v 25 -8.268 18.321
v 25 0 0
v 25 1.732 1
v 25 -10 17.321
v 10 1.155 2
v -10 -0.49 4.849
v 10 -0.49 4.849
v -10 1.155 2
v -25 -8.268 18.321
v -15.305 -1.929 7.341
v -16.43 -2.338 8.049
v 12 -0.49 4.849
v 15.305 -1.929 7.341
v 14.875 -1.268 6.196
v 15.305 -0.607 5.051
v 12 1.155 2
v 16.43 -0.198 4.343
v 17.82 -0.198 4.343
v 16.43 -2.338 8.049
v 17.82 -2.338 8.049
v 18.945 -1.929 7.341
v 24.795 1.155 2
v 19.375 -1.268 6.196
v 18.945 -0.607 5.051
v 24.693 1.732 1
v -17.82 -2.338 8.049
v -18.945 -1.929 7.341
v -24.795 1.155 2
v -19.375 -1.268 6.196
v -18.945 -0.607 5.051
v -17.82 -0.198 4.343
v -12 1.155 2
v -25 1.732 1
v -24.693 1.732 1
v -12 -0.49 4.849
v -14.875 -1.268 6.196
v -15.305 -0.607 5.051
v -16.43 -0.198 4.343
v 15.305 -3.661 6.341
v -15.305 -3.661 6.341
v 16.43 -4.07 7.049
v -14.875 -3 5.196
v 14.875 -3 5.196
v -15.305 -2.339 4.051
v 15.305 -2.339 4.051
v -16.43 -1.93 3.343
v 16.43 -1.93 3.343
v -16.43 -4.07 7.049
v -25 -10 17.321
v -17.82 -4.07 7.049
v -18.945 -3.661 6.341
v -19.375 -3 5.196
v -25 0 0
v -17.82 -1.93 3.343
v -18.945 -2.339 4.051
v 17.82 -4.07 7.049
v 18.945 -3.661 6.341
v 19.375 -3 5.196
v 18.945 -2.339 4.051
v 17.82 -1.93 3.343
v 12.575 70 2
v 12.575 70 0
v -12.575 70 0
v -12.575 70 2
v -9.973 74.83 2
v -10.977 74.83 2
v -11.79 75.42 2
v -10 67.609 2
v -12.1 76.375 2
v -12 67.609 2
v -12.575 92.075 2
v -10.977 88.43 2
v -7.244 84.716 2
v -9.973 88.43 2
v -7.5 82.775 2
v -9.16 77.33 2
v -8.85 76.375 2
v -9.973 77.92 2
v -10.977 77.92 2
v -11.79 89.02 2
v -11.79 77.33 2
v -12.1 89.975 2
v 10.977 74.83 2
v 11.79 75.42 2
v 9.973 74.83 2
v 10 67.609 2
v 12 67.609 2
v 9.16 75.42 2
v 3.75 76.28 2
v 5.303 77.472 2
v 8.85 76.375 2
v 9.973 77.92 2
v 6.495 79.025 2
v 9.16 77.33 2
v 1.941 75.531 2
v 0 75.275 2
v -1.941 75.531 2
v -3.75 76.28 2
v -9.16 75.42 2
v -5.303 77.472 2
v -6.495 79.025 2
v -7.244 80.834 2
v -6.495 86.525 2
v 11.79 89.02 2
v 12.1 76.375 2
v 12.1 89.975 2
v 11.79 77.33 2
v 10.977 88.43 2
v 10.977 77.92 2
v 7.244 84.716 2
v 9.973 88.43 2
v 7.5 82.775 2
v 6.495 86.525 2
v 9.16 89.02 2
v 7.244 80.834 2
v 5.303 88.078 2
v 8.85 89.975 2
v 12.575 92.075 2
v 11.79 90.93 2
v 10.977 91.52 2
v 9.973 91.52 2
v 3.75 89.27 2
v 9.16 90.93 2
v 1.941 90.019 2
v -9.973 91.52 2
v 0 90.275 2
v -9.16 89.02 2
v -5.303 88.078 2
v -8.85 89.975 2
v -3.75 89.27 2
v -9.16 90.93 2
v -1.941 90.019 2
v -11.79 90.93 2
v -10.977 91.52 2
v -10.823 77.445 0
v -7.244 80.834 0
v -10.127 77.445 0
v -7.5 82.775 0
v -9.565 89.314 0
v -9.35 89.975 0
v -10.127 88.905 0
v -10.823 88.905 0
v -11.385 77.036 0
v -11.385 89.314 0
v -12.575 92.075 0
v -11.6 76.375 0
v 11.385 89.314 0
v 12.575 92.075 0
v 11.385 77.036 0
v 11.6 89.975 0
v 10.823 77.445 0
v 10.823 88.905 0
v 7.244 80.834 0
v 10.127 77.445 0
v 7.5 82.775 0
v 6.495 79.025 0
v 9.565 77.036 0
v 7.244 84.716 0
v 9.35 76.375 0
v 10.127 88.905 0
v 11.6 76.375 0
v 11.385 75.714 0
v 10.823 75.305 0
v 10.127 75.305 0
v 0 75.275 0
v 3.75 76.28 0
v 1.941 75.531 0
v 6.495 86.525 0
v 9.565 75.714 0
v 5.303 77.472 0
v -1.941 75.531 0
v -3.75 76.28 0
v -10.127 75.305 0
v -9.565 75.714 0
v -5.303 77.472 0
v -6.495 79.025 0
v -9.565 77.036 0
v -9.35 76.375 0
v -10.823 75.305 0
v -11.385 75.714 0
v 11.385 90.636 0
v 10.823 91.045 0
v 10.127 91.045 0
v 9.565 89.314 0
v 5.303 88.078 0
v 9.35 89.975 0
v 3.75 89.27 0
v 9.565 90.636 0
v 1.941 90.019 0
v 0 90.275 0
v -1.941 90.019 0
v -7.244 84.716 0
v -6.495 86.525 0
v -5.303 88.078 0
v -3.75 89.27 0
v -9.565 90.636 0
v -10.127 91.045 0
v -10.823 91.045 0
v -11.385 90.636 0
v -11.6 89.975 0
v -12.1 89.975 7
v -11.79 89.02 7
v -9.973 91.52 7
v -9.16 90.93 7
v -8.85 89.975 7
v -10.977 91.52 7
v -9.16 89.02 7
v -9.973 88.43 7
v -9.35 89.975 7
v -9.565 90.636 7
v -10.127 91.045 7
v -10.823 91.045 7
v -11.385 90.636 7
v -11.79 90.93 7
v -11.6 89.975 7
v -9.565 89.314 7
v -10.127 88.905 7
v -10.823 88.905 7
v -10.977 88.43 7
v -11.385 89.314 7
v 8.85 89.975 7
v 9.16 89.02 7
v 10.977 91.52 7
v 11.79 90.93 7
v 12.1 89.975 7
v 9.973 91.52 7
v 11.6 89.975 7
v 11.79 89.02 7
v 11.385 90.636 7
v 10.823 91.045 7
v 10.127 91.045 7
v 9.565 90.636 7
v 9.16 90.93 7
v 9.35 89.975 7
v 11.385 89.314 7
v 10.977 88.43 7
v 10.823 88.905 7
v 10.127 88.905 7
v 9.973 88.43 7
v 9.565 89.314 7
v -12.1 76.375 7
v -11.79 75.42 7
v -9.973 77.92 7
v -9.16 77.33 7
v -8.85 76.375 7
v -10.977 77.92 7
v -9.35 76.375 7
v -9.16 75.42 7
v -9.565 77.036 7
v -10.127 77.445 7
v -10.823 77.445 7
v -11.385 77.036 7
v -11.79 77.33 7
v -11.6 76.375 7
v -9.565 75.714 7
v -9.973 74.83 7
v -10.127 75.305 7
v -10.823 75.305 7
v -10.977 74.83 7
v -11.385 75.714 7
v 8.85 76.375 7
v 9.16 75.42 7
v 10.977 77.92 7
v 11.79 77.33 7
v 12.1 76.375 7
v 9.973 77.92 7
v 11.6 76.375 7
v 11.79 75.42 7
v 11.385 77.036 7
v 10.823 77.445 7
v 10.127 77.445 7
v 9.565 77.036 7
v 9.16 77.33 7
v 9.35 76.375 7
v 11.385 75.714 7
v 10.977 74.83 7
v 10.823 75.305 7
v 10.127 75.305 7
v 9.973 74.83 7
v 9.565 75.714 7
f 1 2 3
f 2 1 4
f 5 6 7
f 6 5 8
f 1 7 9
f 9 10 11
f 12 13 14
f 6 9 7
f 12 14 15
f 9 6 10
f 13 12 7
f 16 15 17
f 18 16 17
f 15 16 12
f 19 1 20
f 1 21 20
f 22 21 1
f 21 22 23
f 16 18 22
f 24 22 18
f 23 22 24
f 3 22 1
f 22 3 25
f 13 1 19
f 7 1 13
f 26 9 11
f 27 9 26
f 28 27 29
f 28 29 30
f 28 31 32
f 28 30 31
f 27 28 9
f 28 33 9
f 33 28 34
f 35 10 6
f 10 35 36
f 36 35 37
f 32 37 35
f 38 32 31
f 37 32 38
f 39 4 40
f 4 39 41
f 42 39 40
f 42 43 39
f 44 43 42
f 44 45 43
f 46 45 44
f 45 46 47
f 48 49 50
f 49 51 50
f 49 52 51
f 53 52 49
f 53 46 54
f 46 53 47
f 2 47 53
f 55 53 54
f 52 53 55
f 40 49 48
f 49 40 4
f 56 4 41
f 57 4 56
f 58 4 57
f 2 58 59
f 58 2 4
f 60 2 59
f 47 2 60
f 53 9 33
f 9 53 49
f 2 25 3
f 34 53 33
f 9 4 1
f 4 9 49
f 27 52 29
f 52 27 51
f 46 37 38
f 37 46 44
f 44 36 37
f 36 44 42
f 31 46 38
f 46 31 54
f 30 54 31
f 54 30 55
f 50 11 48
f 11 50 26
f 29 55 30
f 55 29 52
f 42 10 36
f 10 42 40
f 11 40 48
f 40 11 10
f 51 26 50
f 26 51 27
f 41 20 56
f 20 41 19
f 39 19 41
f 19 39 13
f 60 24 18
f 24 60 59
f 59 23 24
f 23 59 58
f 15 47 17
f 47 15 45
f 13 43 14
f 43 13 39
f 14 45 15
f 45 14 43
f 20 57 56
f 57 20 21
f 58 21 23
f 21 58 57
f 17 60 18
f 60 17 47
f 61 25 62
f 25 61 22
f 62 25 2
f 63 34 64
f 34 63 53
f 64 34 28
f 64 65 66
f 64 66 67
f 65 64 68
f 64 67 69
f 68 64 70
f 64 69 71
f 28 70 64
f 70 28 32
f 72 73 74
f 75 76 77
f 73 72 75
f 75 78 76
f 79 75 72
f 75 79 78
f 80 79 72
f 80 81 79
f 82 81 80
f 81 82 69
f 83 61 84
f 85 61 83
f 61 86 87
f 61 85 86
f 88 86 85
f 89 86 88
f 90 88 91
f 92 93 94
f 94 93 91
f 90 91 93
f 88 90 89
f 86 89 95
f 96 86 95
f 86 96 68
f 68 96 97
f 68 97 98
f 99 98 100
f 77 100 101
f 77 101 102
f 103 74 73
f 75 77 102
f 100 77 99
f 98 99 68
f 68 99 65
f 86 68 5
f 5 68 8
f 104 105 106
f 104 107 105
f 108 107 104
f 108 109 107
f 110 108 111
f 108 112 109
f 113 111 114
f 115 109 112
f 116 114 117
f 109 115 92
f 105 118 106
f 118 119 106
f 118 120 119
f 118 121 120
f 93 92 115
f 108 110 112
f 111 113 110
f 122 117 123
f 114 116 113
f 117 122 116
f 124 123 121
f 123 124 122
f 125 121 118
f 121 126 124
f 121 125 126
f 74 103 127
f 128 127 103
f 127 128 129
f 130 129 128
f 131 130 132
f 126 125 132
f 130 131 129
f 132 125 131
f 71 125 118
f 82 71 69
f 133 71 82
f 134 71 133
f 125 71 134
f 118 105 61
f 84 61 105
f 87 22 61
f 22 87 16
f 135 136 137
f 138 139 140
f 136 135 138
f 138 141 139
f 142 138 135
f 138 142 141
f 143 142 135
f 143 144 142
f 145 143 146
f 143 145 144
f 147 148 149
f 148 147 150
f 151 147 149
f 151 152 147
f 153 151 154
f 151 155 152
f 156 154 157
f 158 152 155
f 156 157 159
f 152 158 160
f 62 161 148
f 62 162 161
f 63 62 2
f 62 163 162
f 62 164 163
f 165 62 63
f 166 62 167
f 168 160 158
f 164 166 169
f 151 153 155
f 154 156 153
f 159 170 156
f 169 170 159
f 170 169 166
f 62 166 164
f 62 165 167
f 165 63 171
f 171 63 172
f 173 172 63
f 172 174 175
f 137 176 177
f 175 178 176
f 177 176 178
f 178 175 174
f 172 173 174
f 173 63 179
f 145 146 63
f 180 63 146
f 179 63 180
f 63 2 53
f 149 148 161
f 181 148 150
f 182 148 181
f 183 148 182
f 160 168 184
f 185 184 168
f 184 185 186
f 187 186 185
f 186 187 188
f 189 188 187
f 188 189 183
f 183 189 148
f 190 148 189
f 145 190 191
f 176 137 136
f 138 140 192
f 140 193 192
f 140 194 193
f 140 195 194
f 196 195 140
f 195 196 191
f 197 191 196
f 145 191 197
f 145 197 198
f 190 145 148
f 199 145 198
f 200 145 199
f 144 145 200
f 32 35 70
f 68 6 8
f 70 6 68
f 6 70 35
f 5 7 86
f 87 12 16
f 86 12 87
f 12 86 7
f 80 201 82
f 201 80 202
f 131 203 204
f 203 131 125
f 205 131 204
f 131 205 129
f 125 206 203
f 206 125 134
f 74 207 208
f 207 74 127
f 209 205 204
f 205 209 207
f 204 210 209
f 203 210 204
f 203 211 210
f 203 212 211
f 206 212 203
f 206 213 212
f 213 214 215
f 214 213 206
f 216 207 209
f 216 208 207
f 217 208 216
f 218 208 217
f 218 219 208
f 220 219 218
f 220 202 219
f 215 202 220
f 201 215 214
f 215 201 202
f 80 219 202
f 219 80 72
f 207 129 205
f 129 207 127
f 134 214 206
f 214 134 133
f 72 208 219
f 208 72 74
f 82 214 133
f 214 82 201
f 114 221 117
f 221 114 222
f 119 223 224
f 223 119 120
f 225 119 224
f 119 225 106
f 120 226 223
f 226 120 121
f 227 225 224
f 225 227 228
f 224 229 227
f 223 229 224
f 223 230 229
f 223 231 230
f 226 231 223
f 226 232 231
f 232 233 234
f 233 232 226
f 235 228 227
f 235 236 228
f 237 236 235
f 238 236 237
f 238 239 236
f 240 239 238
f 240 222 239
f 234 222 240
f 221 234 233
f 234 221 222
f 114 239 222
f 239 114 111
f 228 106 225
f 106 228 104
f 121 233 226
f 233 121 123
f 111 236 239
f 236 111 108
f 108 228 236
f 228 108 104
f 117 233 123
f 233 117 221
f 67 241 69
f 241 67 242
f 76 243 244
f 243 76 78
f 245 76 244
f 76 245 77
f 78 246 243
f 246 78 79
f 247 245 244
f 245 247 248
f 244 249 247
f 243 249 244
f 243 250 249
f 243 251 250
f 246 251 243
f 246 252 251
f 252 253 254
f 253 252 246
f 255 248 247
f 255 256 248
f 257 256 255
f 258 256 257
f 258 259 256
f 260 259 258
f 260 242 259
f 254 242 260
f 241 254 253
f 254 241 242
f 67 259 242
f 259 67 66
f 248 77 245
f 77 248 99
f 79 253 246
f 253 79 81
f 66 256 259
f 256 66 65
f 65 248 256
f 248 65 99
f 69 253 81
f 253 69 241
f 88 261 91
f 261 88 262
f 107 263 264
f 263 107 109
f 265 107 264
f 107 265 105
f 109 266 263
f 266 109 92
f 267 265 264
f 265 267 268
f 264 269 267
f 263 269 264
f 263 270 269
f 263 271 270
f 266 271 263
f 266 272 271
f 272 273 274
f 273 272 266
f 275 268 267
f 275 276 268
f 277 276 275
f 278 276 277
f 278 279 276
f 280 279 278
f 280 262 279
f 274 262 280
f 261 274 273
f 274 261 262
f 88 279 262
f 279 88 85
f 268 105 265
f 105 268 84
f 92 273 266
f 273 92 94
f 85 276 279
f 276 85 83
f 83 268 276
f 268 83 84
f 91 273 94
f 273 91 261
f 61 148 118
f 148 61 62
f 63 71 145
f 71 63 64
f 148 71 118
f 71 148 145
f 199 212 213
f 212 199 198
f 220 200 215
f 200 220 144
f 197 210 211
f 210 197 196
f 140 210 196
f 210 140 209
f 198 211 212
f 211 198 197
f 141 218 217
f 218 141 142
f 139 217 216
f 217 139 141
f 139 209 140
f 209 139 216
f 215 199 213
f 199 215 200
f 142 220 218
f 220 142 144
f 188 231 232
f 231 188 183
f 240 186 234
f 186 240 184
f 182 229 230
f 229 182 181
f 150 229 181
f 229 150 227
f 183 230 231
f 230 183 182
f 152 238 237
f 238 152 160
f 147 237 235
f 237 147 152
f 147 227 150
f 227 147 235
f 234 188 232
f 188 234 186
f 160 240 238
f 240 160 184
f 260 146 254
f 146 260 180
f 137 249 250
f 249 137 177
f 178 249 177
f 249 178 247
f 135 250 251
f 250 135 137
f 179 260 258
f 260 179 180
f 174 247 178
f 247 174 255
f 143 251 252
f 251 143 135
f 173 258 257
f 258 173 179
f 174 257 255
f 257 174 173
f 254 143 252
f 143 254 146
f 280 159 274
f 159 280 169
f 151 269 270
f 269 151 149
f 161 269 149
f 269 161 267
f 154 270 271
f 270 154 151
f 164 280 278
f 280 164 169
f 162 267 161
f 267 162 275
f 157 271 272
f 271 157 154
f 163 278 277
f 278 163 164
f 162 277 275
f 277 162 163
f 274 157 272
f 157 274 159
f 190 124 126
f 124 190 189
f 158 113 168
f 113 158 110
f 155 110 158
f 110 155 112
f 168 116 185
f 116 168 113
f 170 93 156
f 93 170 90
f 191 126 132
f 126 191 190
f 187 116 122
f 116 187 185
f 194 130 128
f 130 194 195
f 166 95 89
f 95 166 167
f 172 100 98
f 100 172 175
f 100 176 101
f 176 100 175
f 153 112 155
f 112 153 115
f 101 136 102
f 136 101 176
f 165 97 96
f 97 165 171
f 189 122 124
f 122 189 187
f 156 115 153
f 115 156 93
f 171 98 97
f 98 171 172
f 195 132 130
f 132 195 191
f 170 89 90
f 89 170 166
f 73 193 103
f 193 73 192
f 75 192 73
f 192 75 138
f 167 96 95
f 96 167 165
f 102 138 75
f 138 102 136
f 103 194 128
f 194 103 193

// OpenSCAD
wide_cam_width = 25.15;
wide_cam_height = 24.15;
wide_cam_mount = [
  [-wide_cam_width/2 + 2.1, wide_cam_height/2 - 2.1],
  [wide_cam_width/2 - 2.1, wide_cam_height/2 - 2.1],
  [-wide_cam_width/2 + 2.1, wide_cam_height/2 - 14.6 - 1.1],
  [wide_cam_width/2 - 2.1, wide_cam_height/2 - 14.6 - 1.1],
];

module CameraMount() {
  difference() {
    union() {
      translate([-wide_cam_width/2, -wide_cam_height/2, 0])
        cube([wide_cam_width, wide_cam_height, 2]);
      for (h = wide_cam_mount) {
        translate([h[0], h[1], 2 - 0.1]) {
          cylinder(d=3.25, h=5.1, $fn=10);
        }
      }
    }
    for (h = wide_cam_mount) {
      translate([h[0], h[1], -0.1]) {
        cylinder(d=2.25, h=8.2, $fn=10);
      }
    }
    // hole for lens
    translate([0, wide_cam_height/2 - 2.3 - 7, -0.1])
      cylinder(d=15, h=5);
  }
}

module BumperSpar() {
  rotate([90, 0, 0]) rotate([0, 90, 0]) linear_extrude(height = 2)
    polygon(points=[
      [-1.72, 3.0],
      [70, 0], [0, 0], [-1.72, 3.0]]);
}

module BumperBracket() {
  // 30.75 inner to inner
  // 3.5mm diameter holes (we will probably have to drill out)
  // 60 deg angle from vertical
  rotate([-60, 0, 0]) {
    difference() {
      translate([-25, -20, 0])
        cube([50, 20, 2]);
      translate([-30.75/2 - 3.5/2, -6, -0.1])
        cylinder(d=4.5, h=2.2, $fn=10);
      translate([30.75/2 + 3.5/2, -6, -0.1])
        cylinder(d=4.5, h=2.2, $fn=10);
    }
  }
  linear_extrude(height = 2)
    polygon(points=[
      [-25, 0],
      [-wide_cam_width/2, 70],
      [wide_cam_width/2, 70],
      [25, 0], [-25, 0]]);
  translate([-12, 0, 1.9]) BumperSpar();
  translate([10, 0, 1.9]) BumperSpar();
}

BumperBracket();
translate([0, 80, 0]) CameraMount();
